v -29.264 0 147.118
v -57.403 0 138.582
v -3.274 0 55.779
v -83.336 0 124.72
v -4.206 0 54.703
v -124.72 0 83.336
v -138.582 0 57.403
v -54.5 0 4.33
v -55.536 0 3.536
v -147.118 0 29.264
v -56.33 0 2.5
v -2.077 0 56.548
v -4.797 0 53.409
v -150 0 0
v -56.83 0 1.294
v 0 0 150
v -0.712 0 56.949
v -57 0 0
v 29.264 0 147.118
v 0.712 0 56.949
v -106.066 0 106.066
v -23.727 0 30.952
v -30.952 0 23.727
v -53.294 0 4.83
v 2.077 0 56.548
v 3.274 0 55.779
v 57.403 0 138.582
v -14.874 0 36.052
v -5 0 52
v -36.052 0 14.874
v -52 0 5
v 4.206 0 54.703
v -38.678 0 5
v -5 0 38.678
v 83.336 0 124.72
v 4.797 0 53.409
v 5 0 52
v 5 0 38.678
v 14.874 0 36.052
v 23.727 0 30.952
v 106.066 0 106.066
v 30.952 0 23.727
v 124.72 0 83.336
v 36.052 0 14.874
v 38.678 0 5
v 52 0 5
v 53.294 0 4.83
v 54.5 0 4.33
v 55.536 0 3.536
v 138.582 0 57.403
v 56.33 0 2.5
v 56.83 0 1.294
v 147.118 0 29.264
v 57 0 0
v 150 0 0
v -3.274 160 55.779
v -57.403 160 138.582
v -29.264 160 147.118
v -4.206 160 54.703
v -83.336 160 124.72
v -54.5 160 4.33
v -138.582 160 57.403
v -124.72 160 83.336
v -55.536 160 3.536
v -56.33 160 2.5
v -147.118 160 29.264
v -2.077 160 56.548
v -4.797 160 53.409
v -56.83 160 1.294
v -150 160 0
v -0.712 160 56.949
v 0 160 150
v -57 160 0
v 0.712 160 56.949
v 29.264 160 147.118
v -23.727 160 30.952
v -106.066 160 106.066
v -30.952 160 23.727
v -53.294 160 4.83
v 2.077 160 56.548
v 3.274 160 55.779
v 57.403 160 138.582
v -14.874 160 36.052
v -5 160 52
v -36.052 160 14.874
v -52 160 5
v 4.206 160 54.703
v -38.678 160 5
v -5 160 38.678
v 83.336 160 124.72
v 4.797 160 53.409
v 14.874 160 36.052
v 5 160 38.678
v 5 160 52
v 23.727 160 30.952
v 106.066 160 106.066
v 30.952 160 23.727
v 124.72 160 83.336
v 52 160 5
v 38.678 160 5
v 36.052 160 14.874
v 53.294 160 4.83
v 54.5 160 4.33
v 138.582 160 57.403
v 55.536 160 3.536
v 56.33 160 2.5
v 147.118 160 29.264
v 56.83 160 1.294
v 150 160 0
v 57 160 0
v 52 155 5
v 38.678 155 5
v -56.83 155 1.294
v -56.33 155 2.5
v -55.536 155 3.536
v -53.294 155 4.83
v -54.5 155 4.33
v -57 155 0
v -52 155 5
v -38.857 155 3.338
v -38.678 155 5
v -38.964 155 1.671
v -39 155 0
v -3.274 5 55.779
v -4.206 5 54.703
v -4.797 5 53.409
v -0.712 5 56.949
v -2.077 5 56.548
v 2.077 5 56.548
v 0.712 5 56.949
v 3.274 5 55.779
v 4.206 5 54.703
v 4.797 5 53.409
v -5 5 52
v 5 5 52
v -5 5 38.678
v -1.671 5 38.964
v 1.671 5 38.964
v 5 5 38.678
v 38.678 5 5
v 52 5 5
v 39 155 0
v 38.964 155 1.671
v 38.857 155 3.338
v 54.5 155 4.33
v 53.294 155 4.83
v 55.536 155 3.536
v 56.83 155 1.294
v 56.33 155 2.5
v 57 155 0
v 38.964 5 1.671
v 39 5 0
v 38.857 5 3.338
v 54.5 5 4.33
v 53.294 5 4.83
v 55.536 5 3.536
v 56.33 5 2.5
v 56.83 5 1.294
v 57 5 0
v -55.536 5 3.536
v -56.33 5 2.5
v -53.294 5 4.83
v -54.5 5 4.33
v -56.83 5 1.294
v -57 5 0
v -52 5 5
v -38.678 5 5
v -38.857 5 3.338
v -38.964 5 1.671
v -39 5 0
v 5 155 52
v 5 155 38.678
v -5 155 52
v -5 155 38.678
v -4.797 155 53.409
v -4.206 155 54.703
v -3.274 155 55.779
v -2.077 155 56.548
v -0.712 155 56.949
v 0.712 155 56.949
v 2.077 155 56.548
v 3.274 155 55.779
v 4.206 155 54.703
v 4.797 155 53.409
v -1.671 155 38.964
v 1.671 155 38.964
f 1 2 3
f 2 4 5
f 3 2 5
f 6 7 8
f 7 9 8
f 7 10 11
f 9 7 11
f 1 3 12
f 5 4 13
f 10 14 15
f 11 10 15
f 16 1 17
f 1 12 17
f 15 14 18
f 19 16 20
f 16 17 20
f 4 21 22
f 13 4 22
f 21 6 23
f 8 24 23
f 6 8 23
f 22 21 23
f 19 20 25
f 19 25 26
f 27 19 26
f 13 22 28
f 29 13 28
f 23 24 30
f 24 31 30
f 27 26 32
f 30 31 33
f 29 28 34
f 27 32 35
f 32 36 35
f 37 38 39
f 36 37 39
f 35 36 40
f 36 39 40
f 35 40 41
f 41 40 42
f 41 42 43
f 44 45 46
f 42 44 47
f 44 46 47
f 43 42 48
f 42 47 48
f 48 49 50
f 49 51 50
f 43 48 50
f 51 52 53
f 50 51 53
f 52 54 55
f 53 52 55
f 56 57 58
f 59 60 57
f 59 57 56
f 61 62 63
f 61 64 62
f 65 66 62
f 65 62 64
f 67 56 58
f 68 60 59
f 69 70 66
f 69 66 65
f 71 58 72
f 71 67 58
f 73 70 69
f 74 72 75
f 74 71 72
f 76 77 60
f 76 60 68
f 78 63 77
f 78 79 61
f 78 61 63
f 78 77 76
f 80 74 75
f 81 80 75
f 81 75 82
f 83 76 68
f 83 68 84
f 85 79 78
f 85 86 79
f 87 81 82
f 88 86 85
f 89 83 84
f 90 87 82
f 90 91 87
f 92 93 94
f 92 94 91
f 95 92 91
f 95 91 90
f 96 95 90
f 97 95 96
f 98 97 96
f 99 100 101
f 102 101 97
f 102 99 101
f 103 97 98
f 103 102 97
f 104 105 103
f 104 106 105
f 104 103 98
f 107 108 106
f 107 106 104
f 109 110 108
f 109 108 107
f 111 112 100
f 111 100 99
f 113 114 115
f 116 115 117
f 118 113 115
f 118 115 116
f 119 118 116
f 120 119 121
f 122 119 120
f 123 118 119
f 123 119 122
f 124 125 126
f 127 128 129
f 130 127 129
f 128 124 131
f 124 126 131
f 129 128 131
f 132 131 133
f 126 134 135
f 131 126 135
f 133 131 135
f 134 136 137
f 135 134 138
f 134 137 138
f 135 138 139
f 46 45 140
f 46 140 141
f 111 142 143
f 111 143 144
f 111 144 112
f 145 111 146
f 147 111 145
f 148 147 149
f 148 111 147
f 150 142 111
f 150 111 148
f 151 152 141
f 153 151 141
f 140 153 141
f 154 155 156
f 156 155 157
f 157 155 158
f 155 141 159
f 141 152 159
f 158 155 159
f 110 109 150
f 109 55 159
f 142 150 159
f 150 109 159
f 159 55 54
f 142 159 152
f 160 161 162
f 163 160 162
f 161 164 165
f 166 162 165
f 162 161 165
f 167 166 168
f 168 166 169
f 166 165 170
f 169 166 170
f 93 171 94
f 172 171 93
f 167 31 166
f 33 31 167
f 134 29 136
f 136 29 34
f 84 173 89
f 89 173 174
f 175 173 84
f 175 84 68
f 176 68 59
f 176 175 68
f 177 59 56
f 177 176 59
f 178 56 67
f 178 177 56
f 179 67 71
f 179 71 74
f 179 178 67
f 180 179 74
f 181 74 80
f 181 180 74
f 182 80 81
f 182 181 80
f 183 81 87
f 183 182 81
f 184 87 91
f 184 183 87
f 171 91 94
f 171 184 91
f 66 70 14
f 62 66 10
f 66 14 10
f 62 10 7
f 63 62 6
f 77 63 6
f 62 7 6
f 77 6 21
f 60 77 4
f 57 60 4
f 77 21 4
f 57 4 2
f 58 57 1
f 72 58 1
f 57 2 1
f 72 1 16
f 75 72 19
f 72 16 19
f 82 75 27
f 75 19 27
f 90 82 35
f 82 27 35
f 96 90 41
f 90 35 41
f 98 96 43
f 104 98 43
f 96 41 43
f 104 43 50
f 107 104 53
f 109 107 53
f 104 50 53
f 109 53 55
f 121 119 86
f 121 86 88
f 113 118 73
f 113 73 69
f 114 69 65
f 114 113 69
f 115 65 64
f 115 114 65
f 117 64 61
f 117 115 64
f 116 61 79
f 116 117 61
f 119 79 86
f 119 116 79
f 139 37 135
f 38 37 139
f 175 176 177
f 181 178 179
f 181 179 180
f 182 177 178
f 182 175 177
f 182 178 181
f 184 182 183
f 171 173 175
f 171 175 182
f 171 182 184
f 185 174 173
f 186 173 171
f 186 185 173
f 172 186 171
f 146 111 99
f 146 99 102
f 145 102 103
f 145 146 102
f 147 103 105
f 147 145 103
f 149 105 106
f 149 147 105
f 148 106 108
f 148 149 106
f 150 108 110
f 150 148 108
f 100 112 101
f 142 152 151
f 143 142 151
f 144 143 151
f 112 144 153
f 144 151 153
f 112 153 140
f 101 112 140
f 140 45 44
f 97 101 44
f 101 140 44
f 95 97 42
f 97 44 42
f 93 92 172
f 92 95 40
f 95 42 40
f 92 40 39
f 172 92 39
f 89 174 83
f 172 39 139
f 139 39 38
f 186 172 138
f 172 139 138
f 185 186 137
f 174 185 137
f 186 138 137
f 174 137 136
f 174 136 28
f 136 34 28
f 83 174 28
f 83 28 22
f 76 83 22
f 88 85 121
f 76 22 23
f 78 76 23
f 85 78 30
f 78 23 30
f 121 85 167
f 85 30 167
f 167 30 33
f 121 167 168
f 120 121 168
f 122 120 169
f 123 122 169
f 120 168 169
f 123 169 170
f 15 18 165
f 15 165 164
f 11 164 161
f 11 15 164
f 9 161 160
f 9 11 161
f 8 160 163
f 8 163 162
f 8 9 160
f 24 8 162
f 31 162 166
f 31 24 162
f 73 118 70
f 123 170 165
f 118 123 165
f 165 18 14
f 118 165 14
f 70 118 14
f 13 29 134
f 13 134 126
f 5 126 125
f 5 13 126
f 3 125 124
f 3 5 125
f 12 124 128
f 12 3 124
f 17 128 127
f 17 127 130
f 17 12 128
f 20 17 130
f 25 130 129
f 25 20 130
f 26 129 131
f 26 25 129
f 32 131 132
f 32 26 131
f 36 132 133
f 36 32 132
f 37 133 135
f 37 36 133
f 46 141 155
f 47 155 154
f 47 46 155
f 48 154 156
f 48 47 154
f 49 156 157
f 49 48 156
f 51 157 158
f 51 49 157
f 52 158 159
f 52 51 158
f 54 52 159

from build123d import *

# Parameters (mm, degrees)
BOSS_EXTRUDE1_DEPTH = 160
CUT_EXTRUDE1_START  = -5
CUT_EXTRUDE1_DEPTH  = 5
CUT_EXTRUDE2_START  = -160
SKETCH2_3_R         = 5
SKETCH2_3_W         = 16.92618617
SKETCH2_3_H         = 10
SKETCH2_3_W_2       = 10
SKETCH2_3_H_2       = 16.92618617
CUT_EXTRUDE2_DEPTH  = 5


with BuildPart() as part:
    # Sketch1 → Boss-Extrude1 (new body)
    with BuildSketch(Plane(origin=(0, 0, 0), x_dir=(1, 0, 0), z_dir=(0, 1, 0))):
        with BuildLine():
            Line((150, 0), (39, 0))
            ThreePointArc((39, 0), (0, -39), (-39, 0))
            Line((-39, 0), (-150, 0))
            ThreePointArc((-150, 0), (0, -150), (150, 0))
        make_face()
    extrude(amount=BOSS_EXTRUDE1_DEPTH)

    # Sketch2 → Cut-Extrude1 (cut)
    with BuildSketch(Plane(origin=(0, 160, 0), x_dir=(1, 0, 0), z_dir=(0, 1, 0)).offset(CUT_EXTRUDE1_START)):
        with BuildLine():
            Line((5, -35.07381383), (-5, -35.07381383))
            Line((-5, -35.07381383), (-5, -52))
            ThreePointArc((-5, -52), (0, -57), (5, -52))
            Line((5, -52), (5, -35.07381383))
        make_face()
        with BuildLine():
            Line((-52, -5), (-38.678159212, -5))
            ThreePointArc((-38.678159212, -5), (-39, 0), (-38.678159212, 5))
            Line((-38.678159212, 5), (-52, 5))
            ThreePointArc((-52, 5), (-57, 0), (-52, -5))
        make_face()
        with BuildLine():
            Line((38.678159212, -5), (52, -5))
            ThreePointArc((52, -5), (57, 0), (52, 5))
            Line((52, 5), (38.678159212, 5))
            ThreePointArc((38.678159212, 5), (39, 0), (38.678159212, -5))
        make_face()
    extrude(amount=CUT_EXTRUDE1_DEPTH, mode=Mode.SUBTRACT)

    # Sketch2<3> → Cut-Extrude2 (cut)
    with BuildSketch(Plane(origin=(0, 160, 0), x_dir=(1, 0, 0), z_dir=(0, 1, 0)).offset(CUT_EXTRUDE2_START)):
        with Locations((0, -52)):
            Circle(SKETCH2_3_R)
        with Locations((-52, 0)):
            Circle(SKETCH2_3_R)
        with Locations((52, 0)):
            Circle(SKETCH2_3_R)
        with Locations((-43.536906915, 0)):
            Rectangle(SKETCH2_3_W, SKETCH2_3_H)
        with Locations((0, -43.536906915)):
            Rectangle(SKETCH2_3_W_2, SKETCH2_3_H_2)
        with Locations((43.536906915, 0)):
            Rectangle(SKETCH2_3_W, SKETCH2_3_H)
    extrude(amount=CUT_EXTRUDE2_DEPTH, mode=Mode.SUBTRACT)


solid = part.part
